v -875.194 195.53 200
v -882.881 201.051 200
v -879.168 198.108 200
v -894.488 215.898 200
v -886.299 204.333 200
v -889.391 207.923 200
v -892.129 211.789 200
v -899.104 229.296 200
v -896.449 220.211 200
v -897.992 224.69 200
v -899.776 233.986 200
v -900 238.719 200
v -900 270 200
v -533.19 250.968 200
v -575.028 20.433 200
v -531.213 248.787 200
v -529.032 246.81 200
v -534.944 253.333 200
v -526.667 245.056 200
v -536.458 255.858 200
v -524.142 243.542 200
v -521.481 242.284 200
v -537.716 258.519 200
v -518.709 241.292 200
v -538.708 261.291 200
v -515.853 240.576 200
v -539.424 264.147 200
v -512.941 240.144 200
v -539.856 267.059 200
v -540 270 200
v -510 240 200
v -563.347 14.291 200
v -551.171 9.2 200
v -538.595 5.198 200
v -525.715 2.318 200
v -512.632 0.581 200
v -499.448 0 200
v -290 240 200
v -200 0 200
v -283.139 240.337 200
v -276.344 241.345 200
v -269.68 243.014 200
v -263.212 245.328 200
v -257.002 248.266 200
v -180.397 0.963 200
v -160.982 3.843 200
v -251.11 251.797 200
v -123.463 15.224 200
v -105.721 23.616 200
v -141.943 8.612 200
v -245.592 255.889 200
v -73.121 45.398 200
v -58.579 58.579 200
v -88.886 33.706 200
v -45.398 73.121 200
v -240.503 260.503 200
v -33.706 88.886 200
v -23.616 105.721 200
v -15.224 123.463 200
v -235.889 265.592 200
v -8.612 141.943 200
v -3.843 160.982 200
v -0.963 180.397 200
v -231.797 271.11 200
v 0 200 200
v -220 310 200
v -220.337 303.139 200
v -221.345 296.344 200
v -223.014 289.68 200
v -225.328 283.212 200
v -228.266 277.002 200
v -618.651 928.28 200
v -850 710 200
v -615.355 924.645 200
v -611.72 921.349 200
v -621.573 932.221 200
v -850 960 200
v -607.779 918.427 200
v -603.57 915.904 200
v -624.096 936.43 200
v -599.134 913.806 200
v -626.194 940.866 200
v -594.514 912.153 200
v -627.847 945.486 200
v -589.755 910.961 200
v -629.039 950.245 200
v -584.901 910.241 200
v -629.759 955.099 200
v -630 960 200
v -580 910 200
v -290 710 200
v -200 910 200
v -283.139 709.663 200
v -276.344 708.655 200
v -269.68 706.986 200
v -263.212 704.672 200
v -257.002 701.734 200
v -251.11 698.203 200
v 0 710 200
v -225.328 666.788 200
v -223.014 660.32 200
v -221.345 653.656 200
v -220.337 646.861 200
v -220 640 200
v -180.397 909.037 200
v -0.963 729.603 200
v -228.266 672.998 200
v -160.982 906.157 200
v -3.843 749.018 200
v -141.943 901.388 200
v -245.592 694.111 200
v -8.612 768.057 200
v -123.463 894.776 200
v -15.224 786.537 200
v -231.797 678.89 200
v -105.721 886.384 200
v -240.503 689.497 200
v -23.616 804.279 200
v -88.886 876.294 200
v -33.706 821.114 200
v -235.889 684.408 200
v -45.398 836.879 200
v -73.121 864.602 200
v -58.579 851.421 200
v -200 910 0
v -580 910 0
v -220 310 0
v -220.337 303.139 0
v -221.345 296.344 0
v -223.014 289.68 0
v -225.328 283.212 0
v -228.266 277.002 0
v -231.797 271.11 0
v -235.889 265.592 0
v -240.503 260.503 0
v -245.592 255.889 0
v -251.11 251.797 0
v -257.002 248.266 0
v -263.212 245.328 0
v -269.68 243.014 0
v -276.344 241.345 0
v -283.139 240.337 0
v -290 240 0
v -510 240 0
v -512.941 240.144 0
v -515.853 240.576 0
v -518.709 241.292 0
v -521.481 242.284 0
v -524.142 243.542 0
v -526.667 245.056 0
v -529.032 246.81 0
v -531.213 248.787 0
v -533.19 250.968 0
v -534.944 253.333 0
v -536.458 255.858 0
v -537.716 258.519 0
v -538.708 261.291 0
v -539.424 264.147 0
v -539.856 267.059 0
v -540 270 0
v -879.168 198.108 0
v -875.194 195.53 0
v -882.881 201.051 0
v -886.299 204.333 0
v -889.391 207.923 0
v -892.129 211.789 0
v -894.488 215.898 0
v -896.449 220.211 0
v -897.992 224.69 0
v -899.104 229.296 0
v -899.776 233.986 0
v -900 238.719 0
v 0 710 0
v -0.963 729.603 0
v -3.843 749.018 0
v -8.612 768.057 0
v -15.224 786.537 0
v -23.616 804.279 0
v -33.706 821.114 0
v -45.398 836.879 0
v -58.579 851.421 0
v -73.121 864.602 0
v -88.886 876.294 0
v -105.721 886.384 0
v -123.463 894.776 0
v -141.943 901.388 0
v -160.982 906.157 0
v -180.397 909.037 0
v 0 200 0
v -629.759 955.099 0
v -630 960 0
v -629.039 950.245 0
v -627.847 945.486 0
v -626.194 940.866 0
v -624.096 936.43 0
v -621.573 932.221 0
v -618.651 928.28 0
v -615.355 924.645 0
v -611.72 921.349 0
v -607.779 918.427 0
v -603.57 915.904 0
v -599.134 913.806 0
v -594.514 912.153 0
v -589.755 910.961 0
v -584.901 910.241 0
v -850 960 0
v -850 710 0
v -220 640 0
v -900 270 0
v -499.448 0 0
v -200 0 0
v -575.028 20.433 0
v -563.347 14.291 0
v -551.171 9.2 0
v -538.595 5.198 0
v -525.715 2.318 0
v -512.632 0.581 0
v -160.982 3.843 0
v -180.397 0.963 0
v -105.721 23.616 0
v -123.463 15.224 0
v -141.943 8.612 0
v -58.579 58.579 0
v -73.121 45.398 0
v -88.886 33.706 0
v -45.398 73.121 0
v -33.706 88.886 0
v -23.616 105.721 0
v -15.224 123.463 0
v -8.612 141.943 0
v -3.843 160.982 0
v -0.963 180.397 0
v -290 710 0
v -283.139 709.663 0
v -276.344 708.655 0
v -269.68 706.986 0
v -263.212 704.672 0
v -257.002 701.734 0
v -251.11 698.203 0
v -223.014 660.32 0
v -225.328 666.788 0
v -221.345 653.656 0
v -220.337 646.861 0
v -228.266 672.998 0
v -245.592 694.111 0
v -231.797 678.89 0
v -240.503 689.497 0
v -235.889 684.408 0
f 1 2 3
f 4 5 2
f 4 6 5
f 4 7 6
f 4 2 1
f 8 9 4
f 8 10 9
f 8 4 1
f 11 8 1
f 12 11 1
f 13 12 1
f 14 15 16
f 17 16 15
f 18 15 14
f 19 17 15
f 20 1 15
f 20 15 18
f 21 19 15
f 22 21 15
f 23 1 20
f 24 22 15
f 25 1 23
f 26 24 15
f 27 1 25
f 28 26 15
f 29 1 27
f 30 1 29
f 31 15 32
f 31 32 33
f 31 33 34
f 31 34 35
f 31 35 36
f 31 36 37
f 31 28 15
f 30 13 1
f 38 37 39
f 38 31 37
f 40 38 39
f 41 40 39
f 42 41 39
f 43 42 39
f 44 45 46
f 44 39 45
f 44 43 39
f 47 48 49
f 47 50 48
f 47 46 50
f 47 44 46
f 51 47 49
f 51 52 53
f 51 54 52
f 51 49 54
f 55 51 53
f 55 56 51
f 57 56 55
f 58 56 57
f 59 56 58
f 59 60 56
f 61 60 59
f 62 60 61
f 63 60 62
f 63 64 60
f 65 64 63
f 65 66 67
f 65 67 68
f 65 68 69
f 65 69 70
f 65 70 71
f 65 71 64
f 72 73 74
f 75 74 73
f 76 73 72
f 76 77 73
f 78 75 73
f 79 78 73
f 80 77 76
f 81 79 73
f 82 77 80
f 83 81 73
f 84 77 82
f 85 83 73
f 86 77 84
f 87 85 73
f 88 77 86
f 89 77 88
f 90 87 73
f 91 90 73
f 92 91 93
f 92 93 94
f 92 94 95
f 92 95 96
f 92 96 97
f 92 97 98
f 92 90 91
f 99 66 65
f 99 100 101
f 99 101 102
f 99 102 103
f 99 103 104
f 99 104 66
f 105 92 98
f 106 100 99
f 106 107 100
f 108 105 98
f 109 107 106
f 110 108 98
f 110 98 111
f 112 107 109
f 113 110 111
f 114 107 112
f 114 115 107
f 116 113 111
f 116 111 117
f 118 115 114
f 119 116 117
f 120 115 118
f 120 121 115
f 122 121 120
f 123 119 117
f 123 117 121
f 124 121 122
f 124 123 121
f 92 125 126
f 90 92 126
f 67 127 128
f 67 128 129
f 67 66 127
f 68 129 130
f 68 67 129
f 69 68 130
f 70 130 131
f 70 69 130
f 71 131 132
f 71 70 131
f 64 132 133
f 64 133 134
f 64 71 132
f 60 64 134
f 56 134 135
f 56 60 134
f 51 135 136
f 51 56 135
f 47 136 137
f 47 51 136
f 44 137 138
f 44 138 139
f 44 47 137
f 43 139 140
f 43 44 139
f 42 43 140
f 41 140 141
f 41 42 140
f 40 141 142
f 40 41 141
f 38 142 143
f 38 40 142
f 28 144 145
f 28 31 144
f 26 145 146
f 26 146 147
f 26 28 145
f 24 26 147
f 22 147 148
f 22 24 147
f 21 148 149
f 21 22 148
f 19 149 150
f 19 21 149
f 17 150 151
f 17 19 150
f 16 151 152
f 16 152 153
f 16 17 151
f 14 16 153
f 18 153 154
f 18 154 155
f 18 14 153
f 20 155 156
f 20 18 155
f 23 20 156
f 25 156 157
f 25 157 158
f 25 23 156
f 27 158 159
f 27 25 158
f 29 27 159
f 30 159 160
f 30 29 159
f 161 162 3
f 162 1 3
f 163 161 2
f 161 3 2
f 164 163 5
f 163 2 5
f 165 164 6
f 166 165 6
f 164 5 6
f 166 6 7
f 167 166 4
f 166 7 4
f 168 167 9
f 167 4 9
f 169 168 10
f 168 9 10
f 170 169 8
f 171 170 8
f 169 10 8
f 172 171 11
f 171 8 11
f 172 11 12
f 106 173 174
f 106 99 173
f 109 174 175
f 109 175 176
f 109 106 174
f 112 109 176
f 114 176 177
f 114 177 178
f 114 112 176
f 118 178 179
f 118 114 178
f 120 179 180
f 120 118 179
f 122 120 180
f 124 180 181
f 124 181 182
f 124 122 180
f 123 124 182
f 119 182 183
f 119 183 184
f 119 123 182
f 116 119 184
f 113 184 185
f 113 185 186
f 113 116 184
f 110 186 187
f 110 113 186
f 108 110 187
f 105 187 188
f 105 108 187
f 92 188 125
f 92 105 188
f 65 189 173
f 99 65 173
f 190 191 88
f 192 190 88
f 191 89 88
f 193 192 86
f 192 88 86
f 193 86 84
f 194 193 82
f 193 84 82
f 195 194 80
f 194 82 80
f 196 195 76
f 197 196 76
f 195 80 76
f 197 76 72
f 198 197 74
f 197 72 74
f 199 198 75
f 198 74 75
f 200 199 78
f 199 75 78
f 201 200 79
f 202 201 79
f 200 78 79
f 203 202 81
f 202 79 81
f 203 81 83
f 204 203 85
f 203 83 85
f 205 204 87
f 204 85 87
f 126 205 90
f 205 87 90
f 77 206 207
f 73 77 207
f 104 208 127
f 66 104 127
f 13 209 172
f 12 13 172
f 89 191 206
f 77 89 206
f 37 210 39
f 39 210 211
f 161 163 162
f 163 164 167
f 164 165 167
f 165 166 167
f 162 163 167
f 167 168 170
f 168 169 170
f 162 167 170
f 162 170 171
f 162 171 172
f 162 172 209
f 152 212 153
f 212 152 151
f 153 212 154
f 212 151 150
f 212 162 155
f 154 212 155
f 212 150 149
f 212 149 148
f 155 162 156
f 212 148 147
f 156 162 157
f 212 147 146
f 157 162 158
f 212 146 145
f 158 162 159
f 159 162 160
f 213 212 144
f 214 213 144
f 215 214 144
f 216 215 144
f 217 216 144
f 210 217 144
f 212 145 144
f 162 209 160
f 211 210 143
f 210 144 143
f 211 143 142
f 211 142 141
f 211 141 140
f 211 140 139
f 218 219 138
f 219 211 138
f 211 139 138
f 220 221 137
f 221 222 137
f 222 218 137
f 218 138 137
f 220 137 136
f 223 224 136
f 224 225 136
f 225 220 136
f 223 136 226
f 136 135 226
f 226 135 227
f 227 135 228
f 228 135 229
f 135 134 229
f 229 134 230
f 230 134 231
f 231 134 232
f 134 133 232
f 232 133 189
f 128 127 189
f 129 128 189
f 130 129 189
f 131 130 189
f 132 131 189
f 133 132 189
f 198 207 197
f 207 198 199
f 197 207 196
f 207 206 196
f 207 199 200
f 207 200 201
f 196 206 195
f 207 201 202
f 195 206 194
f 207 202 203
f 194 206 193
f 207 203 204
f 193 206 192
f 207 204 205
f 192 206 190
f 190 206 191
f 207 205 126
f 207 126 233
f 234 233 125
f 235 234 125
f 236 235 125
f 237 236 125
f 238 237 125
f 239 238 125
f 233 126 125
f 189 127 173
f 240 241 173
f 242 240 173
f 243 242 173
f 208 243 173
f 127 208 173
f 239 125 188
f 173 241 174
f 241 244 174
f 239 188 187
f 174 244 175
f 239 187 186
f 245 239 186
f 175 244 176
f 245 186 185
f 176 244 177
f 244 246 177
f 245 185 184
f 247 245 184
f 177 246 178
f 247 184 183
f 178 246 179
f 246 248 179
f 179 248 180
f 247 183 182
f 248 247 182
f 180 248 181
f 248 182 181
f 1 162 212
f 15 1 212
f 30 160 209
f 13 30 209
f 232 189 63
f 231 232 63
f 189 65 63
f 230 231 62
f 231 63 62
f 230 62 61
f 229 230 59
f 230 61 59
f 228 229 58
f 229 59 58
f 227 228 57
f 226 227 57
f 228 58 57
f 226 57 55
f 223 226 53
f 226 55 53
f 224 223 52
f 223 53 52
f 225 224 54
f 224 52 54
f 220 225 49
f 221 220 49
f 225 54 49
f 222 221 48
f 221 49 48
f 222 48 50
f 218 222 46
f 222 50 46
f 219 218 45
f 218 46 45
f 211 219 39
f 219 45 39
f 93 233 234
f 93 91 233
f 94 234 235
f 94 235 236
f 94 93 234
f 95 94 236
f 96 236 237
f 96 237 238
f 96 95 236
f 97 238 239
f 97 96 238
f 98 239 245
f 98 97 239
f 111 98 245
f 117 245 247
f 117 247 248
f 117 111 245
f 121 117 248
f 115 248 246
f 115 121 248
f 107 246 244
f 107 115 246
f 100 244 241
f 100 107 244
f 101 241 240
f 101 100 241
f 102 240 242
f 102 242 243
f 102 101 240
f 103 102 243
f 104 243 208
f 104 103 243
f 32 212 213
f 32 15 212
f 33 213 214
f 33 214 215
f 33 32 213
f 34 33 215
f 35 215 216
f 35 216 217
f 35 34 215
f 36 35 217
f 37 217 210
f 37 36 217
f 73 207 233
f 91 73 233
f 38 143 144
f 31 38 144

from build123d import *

# Parameters (mm, degrees)
RESSALTO_EXTRUS_O1_DEPTH = 200
FILETE1_R                = 200
FILETE2_R                = 200
FILETE3_R                = 70
FILETE4_R                = 70
FILETE5_R                = 30
FILETE6_R                = 50
FILETE7_R                = 50
FILETE8_R                = 150


with BuildPart() as part:
    # Esboço1 → Ressalto-extrusão1 (new body)
    with BuildSketch(Plane.XY):
        Polygon((0, 0), (0, 910), (-630, 910), (-630, 960), (-850, 960), (-850, 710), (-220, 710), (-220, 240), (-540, 240), (-540, 270), (-900, 270), (-900, 210), (-540, 0), align=None)
    extrude(amount=RESSALTO_EXTRUS_O1_DEPTH)

    # Filete1
    filete1_edges = [part.edges().sort_by_distance(p)[0] for p in [
        (0, 910, 100),
    ]]
    fillet(filete1_edges, radius=FILETE1_R)

    # Filete2
    filete2_edges = [part.edges().sort_by_distance(p)[0] for p in [
        (0, 0, 100),
    ]]
    fillet(filete2_edges, radius=FILETE2_R)

    # Filete3
    filete3_edges = [part.edges().sort_by_distance(p)[0] for p in [
        (-220, 710, 100),
    ]]
    fillet(filete3_edges, radius=FILETE3_R)

    # Filete4
    filete4_edges = [part.edges().sort_by_distance(p)[0] for p in [
        (-220, 240, 100),
    ]]
    fillet(filete4_edges, radius=FILETE4_R)

    # Filete5
    filete5_edges = [part.edges().sort_by_distance(p)[0] for p in [
        (-540, 240, 100),
    ]]
    fillet(filete5_edges, radius=FILETE5_R - 0.0001)  # a hair under: the kernel refuses the full size

    # Filete6
    filete6_edges = [part.edges().sort_by_distance(p)[0] for p in [
        (-630, 910, 100),
    ]]
    fillet(filete6_edges, radius=FILETE6_R - 0.0001)  # a hair under: the kernel refuses the full size

    # Filete7
    filete7_edges = [part.edges().sort_by_distance(p)[0] for p in [
        (-900, 210, 100),
    ]]
    fillet(filete7_edges, radius=FILETE7_R)

    # Filete8
    filete8_edges = [part.edges().sort_by_distance(p)[0] for p in [
        (-540, 0, 100),
    ]]
    fillet(filete8_edges, radius=FILETE8_R)


solid = part.part
